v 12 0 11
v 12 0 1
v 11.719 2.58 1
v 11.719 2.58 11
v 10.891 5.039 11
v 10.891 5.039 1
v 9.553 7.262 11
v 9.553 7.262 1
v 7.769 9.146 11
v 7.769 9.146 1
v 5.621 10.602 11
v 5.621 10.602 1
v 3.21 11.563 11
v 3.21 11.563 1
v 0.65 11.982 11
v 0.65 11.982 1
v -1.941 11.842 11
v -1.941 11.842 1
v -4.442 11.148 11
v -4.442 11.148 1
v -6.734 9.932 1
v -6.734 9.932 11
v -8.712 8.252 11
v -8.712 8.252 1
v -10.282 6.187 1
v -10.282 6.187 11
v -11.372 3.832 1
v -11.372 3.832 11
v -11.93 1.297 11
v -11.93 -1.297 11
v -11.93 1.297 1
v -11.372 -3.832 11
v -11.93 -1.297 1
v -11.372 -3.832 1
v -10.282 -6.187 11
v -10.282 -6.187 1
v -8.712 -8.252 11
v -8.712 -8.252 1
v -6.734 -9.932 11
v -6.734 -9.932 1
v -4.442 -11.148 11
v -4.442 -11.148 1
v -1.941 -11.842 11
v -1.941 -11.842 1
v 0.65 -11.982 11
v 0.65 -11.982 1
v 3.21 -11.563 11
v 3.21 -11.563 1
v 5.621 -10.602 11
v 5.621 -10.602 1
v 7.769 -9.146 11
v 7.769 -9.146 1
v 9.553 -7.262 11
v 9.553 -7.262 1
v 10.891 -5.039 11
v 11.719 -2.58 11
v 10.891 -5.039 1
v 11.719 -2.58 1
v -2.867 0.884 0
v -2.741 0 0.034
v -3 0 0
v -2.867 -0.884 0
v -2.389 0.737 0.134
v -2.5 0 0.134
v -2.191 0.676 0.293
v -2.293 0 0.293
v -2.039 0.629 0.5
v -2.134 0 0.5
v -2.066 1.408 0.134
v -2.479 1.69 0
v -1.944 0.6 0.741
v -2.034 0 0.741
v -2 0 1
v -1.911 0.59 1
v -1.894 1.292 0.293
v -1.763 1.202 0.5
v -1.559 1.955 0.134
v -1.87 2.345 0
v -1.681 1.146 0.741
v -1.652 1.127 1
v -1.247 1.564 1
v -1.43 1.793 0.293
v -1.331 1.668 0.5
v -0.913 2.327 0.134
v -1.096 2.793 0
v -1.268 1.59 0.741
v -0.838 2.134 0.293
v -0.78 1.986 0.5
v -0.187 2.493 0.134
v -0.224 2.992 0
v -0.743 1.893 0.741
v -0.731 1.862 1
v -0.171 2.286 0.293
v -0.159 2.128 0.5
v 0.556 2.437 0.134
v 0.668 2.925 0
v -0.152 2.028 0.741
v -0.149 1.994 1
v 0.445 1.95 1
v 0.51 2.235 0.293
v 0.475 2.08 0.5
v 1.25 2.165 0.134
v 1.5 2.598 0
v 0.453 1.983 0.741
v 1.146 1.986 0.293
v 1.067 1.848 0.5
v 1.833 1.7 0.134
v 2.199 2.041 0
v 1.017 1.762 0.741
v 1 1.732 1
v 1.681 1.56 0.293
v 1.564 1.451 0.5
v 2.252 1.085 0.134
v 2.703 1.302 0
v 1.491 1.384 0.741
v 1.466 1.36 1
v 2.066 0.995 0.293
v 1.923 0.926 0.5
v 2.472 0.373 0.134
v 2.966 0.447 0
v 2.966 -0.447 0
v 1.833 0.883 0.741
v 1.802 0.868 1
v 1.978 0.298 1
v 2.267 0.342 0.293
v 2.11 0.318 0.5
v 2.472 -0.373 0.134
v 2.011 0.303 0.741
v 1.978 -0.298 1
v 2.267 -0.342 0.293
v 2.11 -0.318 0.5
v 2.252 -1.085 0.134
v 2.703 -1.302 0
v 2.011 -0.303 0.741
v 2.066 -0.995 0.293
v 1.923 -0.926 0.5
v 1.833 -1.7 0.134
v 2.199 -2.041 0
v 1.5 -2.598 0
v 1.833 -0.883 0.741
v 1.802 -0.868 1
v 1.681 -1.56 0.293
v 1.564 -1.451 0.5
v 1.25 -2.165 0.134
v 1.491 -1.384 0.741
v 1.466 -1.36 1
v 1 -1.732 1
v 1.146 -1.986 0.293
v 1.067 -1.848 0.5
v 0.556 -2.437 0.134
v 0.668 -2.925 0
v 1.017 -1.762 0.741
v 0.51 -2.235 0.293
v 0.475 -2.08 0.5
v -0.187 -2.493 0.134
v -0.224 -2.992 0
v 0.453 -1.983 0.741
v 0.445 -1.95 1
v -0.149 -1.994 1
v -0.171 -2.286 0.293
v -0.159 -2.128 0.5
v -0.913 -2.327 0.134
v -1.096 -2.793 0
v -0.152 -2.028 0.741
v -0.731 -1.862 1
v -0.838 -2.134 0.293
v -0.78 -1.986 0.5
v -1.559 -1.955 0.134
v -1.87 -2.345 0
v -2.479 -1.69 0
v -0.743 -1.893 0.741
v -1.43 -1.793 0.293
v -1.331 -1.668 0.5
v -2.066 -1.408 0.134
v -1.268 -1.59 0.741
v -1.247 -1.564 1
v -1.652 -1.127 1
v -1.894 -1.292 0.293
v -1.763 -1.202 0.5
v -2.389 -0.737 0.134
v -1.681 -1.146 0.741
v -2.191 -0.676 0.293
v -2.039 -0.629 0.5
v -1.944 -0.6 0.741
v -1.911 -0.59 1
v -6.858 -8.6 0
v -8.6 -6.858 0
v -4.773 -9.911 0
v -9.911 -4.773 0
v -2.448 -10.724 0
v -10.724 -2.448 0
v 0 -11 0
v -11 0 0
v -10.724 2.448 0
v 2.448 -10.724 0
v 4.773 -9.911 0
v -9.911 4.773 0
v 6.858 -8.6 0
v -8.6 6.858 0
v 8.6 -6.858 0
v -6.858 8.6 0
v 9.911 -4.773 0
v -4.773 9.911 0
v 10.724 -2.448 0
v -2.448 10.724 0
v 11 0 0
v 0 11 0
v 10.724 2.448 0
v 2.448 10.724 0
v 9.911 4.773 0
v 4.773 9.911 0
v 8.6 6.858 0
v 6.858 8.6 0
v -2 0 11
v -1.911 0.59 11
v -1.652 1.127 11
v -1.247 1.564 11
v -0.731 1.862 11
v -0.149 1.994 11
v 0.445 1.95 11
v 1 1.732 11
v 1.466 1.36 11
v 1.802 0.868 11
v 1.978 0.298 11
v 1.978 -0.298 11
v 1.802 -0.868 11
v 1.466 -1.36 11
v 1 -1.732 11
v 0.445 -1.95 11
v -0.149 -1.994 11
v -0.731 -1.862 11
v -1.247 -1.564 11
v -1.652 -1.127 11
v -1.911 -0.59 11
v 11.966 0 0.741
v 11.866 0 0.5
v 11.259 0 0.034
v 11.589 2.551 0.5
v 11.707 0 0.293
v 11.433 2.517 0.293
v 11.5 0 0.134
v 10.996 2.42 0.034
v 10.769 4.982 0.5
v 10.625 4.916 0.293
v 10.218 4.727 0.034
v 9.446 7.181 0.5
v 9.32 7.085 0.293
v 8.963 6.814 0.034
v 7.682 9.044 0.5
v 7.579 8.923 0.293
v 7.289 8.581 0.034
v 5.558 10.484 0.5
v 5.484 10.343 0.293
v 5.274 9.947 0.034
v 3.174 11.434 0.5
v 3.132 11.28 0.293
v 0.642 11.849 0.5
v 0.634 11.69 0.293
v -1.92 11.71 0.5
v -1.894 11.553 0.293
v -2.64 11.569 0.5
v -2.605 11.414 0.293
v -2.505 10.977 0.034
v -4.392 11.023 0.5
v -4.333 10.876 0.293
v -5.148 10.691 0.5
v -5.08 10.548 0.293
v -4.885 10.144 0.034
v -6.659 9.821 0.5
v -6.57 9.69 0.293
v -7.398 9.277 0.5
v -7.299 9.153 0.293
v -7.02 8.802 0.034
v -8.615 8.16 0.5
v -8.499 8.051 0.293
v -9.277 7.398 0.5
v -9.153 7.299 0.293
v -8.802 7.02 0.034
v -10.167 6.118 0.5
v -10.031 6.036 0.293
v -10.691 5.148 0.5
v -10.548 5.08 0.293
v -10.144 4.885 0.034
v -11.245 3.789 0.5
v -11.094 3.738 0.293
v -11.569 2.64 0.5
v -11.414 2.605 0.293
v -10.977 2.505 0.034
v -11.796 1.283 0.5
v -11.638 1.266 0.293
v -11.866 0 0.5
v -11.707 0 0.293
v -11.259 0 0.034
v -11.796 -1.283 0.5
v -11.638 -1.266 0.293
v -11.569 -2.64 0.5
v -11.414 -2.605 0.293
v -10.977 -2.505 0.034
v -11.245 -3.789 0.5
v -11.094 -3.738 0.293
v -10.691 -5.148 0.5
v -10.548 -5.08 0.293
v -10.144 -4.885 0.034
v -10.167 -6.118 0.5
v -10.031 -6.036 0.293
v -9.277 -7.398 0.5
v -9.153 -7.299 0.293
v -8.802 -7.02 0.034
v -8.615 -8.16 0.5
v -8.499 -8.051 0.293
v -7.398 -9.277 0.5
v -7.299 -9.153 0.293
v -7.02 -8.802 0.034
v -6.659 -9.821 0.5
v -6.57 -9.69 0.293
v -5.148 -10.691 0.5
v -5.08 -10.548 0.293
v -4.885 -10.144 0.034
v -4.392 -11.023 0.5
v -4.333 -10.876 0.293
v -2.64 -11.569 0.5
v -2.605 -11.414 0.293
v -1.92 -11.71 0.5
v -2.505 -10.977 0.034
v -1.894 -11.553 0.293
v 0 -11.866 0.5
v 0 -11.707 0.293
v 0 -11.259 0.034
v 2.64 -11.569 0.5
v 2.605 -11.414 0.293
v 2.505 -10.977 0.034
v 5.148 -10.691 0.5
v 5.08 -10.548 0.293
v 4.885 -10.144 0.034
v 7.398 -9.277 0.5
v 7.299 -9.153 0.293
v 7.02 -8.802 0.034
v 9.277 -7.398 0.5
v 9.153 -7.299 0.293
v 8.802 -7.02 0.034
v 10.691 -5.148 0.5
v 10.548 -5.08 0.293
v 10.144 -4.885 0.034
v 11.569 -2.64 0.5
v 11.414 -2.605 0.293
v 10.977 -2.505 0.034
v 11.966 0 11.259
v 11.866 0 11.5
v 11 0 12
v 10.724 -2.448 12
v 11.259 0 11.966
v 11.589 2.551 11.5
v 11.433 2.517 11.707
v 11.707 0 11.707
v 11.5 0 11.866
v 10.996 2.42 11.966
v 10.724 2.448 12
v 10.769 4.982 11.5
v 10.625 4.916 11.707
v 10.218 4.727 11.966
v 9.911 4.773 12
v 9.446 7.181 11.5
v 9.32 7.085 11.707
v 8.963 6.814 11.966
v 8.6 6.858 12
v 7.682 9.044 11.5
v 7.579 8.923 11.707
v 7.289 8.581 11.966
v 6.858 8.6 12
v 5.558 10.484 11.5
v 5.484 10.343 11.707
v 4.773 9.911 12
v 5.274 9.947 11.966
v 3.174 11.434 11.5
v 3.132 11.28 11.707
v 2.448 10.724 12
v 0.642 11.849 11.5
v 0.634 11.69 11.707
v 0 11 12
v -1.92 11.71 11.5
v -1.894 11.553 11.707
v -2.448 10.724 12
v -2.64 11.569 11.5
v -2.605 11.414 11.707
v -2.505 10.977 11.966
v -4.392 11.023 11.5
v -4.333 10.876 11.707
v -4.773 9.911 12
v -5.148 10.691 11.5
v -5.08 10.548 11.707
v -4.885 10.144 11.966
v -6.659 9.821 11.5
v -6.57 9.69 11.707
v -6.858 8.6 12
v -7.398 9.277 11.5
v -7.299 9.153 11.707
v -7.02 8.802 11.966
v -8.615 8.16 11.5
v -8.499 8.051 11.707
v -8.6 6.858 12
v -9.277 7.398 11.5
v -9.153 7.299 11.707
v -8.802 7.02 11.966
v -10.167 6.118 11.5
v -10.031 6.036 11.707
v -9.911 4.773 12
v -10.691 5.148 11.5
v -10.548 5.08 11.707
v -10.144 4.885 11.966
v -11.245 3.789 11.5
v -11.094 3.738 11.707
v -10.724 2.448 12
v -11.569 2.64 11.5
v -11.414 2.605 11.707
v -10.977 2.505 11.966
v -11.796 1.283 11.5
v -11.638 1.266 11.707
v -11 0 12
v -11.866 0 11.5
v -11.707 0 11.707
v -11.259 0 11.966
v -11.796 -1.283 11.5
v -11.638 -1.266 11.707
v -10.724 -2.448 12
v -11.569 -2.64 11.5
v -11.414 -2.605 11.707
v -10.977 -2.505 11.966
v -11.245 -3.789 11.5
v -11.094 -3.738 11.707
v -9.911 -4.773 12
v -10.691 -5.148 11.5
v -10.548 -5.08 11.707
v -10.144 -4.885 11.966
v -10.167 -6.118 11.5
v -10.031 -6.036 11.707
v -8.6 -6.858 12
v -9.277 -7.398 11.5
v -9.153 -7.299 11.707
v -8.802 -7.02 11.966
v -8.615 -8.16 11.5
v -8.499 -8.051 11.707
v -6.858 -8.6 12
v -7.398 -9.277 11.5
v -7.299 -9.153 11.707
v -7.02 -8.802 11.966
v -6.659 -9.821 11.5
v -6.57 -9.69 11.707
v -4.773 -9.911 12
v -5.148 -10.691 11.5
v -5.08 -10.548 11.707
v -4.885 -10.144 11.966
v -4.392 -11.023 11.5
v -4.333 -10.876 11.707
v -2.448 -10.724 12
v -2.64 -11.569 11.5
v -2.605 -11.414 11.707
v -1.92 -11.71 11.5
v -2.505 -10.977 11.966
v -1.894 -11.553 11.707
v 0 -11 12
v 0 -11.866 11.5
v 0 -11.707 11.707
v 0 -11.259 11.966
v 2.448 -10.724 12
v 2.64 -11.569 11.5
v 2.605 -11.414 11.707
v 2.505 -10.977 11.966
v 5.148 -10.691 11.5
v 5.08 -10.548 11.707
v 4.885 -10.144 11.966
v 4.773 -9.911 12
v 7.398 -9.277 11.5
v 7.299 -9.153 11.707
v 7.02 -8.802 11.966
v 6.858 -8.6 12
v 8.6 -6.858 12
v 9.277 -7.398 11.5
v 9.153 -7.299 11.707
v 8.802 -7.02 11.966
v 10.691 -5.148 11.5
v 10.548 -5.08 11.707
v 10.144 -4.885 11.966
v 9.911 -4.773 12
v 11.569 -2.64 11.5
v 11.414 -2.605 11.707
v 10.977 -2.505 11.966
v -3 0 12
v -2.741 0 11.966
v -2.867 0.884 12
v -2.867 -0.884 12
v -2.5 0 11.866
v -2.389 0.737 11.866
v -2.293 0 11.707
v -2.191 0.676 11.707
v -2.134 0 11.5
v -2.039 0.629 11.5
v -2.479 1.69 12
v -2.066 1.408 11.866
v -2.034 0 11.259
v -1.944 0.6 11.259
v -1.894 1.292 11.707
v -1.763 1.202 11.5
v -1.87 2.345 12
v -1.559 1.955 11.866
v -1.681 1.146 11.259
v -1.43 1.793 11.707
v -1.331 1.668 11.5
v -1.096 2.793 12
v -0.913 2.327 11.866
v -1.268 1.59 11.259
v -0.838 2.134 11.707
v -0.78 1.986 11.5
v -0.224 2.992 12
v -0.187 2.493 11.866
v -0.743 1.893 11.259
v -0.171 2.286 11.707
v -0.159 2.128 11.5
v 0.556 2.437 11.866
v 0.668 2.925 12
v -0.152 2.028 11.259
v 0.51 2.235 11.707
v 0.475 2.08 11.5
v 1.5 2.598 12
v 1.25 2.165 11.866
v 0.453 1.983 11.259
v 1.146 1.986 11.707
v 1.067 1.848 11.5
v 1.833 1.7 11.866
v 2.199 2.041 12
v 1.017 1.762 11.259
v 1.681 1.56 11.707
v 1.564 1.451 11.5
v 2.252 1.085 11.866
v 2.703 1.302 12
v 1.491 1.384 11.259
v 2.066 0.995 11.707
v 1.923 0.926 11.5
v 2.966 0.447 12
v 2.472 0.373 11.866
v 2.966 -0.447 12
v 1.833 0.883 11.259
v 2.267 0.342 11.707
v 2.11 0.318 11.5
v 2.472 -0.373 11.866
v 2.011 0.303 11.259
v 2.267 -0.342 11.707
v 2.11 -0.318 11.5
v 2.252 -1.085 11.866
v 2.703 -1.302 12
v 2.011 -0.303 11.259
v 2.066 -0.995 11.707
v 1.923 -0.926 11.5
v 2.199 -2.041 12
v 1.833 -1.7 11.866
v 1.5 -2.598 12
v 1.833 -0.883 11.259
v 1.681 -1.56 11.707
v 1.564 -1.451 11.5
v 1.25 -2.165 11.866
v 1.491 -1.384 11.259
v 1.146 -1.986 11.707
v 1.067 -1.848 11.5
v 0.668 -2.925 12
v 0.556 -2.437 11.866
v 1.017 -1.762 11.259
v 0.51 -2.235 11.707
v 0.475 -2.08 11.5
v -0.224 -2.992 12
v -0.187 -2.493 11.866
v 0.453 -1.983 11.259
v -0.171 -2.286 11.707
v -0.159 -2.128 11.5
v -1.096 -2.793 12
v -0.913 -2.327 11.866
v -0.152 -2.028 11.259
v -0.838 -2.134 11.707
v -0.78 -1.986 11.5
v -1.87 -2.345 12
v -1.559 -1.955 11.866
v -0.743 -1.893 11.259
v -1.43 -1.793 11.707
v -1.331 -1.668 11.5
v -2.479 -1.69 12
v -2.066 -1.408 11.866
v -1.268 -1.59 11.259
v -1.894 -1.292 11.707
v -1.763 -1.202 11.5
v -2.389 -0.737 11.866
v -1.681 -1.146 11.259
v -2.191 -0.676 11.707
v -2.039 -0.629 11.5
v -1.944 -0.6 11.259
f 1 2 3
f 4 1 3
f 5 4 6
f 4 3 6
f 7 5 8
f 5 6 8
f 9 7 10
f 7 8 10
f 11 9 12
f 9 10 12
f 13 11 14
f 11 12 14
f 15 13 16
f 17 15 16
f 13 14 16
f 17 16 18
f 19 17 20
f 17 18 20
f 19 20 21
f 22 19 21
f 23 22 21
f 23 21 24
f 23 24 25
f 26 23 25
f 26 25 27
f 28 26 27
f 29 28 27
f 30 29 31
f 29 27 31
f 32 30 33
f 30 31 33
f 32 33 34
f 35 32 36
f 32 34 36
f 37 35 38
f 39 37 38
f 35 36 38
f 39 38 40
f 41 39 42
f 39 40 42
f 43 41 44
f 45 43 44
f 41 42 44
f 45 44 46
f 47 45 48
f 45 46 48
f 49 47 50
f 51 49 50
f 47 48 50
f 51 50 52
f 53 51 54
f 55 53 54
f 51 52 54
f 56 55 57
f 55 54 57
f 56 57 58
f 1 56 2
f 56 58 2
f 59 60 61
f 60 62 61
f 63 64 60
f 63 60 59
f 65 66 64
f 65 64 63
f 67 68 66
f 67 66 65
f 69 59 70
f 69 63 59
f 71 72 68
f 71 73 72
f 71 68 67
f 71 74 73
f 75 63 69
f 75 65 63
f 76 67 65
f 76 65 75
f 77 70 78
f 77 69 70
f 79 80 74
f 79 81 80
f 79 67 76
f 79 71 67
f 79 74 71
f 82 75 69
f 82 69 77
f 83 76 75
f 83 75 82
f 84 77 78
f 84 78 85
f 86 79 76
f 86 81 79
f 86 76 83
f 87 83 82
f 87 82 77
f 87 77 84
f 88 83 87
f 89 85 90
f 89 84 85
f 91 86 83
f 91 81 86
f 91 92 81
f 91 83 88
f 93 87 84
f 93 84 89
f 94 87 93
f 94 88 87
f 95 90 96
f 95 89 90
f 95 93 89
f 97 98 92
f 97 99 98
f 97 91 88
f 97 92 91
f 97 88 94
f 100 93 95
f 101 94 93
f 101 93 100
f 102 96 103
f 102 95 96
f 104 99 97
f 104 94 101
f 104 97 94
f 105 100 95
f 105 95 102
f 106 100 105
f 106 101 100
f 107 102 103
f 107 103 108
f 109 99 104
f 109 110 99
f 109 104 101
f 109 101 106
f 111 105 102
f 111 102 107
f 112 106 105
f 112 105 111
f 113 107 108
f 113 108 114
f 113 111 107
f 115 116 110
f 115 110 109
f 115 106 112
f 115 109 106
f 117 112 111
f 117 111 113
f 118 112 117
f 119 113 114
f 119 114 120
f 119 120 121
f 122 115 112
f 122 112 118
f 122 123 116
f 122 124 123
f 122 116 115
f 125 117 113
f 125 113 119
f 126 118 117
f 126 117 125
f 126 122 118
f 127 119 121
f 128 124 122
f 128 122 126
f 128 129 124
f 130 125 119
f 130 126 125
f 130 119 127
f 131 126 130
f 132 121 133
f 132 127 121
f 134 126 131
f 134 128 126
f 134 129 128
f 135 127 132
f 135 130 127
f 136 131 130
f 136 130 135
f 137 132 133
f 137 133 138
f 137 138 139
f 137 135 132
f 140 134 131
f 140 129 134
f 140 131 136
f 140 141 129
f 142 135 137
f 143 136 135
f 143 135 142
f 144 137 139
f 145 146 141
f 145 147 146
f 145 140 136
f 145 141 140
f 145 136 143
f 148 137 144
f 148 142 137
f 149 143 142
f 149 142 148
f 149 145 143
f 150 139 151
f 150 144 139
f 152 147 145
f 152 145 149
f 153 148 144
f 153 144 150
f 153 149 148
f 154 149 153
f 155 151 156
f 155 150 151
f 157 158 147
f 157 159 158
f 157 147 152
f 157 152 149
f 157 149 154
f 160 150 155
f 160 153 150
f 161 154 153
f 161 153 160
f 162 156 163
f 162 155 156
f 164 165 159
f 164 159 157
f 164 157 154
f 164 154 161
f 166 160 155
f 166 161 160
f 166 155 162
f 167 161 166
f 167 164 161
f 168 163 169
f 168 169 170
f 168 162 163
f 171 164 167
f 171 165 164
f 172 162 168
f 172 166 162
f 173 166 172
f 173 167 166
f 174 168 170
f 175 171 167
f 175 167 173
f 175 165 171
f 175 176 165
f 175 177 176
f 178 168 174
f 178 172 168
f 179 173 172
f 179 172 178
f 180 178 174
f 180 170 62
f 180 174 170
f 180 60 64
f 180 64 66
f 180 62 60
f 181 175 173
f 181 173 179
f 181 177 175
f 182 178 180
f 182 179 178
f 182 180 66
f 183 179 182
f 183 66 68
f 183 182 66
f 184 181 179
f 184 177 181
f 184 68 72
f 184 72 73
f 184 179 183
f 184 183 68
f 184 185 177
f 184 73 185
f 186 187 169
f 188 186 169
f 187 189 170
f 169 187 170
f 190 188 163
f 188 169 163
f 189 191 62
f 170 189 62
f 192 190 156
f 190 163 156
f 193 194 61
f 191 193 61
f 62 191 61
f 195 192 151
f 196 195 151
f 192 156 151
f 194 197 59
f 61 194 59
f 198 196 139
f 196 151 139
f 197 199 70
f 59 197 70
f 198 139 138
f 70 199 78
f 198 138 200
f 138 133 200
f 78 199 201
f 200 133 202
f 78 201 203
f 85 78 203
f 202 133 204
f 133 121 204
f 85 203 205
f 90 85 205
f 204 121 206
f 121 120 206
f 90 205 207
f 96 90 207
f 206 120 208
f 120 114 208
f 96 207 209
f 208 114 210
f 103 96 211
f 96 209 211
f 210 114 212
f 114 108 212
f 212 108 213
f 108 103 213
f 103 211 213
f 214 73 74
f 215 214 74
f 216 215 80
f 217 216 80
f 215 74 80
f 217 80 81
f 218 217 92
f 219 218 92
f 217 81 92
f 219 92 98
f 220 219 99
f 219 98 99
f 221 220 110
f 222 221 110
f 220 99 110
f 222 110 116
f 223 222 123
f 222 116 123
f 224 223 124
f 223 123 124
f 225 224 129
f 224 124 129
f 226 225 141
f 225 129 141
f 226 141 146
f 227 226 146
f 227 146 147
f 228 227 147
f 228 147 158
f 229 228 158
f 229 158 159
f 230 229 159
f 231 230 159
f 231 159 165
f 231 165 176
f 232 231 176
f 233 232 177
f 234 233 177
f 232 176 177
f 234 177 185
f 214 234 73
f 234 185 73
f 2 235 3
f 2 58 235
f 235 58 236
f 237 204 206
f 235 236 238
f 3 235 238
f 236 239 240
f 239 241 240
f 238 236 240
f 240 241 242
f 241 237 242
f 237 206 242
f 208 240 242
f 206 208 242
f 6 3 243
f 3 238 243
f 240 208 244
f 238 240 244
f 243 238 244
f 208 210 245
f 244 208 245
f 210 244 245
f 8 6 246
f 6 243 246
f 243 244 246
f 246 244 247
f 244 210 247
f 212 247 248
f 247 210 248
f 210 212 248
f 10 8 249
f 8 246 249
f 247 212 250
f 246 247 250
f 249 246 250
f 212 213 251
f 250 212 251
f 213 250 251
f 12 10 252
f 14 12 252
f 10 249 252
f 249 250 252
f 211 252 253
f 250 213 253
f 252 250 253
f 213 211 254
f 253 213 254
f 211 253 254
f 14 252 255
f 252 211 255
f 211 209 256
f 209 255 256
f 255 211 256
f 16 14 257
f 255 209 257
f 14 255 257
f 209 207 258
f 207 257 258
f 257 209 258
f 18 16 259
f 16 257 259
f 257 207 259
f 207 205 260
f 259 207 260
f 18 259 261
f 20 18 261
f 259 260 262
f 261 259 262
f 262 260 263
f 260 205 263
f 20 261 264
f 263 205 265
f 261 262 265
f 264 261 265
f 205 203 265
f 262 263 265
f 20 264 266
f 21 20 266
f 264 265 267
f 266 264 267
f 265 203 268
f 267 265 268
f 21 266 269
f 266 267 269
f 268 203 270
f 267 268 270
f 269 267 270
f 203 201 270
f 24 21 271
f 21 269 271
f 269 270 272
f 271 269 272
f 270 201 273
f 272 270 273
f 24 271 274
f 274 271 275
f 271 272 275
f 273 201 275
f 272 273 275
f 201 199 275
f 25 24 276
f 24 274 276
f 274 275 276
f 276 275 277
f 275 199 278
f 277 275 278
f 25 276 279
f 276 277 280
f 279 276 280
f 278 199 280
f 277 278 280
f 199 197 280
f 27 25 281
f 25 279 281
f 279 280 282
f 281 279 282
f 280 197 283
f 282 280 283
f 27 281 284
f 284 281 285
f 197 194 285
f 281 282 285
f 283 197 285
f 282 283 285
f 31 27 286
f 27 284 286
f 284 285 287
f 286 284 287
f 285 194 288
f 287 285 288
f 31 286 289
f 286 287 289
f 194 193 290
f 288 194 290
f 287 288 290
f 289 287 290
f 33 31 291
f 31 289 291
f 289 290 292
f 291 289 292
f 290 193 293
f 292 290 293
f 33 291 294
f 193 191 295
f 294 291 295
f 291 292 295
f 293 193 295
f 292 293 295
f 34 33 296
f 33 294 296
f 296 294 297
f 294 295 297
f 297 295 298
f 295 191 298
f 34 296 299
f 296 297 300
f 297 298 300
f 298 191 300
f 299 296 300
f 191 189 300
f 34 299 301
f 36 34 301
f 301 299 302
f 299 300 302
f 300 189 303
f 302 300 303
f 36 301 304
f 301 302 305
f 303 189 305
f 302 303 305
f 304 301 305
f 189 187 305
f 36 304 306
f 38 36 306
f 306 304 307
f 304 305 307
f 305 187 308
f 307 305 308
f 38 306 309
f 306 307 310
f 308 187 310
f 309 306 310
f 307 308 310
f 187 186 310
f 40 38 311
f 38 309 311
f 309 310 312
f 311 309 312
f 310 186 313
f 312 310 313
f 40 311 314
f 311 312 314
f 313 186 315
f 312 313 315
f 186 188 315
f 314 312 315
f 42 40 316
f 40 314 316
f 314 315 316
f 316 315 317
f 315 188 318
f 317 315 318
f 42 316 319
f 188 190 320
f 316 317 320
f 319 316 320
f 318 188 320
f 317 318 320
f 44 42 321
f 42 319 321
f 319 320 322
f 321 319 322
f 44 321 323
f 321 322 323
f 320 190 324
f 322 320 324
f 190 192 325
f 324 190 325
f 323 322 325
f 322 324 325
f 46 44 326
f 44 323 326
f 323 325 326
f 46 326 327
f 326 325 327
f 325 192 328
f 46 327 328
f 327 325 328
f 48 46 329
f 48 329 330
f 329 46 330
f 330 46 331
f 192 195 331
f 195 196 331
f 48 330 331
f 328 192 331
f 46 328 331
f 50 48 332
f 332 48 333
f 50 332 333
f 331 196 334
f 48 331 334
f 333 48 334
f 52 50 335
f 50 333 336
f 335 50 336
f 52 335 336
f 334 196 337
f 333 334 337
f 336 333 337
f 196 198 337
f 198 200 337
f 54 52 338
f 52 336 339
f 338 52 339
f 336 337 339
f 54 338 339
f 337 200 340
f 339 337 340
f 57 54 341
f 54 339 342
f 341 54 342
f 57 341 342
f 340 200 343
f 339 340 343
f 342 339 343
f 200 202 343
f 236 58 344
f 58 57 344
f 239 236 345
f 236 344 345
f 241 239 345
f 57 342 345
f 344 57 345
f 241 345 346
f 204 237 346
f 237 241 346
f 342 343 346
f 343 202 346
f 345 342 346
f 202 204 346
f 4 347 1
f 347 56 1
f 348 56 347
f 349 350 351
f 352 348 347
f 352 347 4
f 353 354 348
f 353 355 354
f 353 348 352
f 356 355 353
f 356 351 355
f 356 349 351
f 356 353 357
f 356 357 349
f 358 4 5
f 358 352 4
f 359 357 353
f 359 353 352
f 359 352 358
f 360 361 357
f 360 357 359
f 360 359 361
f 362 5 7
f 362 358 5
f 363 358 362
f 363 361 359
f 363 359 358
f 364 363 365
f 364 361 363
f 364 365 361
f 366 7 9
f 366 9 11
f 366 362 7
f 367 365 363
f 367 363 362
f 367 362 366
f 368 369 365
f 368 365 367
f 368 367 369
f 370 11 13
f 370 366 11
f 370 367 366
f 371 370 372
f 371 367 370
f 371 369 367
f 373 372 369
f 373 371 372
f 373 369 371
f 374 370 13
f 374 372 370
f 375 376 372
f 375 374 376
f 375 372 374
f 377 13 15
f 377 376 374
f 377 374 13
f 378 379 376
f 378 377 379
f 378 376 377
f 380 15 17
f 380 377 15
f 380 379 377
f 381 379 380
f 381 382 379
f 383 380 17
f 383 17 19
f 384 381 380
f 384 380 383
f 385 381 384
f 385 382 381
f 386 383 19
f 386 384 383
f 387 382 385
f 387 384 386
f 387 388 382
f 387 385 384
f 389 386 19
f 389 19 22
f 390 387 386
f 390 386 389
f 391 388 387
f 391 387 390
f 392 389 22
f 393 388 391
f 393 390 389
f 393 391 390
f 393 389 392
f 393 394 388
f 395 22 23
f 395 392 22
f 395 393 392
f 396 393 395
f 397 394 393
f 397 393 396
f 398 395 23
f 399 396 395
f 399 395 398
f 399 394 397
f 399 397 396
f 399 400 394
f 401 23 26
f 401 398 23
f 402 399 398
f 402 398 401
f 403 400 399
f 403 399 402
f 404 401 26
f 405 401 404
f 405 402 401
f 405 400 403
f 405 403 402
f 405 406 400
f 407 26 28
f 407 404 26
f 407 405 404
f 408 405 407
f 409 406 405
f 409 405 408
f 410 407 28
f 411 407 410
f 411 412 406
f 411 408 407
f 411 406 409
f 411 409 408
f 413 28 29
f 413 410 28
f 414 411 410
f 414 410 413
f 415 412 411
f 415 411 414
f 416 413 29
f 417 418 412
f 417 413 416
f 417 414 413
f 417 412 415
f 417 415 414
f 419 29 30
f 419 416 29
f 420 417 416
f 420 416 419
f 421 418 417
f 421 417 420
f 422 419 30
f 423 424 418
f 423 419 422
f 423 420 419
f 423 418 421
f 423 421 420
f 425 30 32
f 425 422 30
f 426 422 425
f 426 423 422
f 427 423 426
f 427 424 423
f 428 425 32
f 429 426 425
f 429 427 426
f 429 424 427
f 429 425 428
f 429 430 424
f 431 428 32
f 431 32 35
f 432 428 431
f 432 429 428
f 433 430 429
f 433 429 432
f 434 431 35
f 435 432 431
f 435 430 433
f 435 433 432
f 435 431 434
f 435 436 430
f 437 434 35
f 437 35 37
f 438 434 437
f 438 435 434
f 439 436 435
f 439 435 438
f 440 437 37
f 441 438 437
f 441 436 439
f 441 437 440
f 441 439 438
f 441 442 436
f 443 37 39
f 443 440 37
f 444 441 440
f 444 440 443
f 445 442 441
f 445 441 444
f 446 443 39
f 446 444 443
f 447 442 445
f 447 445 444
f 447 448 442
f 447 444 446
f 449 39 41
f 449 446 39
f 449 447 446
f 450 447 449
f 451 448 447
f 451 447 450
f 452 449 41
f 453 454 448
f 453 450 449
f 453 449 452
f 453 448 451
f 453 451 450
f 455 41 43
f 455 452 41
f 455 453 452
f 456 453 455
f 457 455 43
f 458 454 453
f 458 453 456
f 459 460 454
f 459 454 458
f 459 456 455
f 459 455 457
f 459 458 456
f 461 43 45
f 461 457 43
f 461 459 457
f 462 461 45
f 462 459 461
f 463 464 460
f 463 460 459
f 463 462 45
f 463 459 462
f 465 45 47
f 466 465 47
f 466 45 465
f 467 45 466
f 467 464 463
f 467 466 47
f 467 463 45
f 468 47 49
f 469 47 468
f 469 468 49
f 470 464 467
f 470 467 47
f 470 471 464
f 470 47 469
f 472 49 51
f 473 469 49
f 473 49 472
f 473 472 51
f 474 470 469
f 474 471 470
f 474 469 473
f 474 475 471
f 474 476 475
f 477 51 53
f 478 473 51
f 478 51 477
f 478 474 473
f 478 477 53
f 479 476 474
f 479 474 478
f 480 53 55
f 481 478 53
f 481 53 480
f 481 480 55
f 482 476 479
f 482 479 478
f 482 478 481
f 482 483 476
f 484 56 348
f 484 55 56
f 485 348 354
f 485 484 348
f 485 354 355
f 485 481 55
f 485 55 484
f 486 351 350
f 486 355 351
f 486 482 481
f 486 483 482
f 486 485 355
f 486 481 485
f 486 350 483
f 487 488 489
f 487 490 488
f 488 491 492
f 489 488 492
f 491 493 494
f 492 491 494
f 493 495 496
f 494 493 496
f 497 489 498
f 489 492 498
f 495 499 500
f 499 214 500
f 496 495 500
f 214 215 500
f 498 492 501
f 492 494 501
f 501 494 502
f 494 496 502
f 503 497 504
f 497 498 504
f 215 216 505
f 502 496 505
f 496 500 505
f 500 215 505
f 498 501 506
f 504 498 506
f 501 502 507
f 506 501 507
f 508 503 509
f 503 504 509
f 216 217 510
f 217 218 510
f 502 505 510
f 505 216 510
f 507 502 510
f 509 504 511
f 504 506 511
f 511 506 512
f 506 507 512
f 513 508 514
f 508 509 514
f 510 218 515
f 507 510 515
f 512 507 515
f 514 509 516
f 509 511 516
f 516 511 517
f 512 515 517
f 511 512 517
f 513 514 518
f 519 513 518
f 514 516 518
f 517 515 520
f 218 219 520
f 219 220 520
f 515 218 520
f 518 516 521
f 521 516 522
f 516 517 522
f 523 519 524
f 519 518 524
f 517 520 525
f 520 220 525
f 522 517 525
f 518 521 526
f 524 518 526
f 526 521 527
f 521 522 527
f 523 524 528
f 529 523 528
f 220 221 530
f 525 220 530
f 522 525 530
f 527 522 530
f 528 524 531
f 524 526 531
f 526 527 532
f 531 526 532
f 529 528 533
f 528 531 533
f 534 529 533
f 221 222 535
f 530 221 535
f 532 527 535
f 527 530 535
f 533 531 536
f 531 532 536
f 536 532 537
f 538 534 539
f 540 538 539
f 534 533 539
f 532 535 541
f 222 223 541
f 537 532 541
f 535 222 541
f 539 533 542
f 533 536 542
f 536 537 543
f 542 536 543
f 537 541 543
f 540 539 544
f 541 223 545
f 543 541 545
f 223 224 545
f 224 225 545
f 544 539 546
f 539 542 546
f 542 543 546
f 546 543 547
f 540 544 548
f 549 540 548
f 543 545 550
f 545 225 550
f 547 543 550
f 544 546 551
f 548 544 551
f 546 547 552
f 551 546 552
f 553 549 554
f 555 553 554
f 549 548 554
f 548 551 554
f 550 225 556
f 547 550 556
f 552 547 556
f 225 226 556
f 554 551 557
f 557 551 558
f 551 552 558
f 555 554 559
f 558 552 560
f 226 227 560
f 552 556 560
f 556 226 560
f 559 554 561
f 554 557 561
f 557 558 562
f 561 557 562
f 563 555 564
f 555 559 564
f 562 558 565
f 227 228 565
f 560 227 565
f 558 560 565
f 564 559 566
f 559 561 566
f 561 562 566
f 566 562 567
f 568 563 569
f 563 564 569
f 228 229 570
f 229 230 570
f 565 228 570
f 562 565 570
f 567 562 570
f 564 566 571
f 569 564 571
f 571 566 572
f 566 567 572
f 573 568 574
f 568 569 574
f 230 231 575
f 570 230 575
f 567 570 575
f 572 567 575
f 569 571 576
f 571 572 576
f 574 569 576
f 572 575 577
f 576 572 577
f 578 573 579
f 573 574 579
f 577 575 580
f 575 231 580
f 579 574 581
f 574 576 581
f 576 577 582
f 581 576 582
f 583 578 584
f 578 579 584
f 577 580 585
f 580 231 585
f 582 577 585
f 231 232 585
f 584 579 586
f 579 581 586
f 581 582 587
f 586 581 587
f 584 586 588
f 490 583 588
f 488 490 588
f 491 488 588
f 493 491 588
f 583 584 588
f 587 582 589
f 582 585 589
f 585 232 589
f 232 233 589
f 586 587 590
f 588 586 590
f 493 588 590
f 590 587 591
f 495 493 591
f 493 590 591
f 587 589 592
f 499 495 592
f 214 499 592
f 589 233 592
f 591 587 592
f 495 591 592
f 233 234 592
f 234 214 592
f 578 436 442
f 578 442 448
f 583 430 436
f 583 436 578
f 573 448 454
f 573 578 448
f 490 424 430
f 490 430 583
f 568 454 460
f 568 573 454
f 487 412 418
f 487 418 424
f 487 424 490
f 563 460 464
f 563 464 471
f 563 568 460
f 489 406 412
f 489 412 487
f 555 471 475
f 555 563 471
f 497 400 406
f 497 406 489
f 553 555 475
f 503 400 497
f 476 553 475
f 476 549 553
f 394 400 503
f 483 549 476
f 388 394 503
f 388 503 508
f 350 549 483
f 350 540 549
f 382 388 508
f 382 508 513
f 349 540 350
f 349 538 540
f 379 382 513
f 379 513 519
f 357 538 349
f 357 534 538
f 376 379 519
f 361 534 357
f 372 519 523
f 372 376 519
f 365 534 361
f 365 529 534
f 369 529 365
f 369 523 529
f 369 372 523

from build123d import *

# Parameters (mm, degrees)
SKETCH_1_R          = 12
EXTRUDE_1_DEPTH     = 12
FILLET_1_R          = 1
SKETCH_2_R          = 2
CUT_EXTRUDE_1_DEPTH = 12
FILLET_2_R          = 1


with BuildPart() as part:
    # 草图1 → 凸台-拉伸1 (new body)
    with BuildSketch(Plane.XY):
        Circle(SKETCH_1_R)
    extrude(amount=EXTRUDE_1_DEPTH)

    # 圆角1
    fillet_1_edges = [part.edges().sort_by_distance(p)[0] for p in [
        (-12, 0, 0),
        (-12, 0, 12),
    ]]
    fillet(fillet_1_edges, radius=FILLET_1_R)

    # 草图2 → 切除-拉伸1 (cut)
    with BuildSketch(Plane(origin=(0, 0, 0), x_dir=(-1, 0, 0), z_dir=(0, 0, -1))):
        Circle(SKETCH_2_R)
    extrude(amount=-CUT_EXTRUDE_1_DEPTH, mode=Mode.SUBTRACT)

    # 圆角2
    fillet_2_edges = [part.edges().sort_by_distance(p)[0] for p in [
        (2, 0, 12),
        (2, 0, 0),
    ]]
    fillet(fillet_2_edges, radius=FILLET_2_R)


solid = part.part
